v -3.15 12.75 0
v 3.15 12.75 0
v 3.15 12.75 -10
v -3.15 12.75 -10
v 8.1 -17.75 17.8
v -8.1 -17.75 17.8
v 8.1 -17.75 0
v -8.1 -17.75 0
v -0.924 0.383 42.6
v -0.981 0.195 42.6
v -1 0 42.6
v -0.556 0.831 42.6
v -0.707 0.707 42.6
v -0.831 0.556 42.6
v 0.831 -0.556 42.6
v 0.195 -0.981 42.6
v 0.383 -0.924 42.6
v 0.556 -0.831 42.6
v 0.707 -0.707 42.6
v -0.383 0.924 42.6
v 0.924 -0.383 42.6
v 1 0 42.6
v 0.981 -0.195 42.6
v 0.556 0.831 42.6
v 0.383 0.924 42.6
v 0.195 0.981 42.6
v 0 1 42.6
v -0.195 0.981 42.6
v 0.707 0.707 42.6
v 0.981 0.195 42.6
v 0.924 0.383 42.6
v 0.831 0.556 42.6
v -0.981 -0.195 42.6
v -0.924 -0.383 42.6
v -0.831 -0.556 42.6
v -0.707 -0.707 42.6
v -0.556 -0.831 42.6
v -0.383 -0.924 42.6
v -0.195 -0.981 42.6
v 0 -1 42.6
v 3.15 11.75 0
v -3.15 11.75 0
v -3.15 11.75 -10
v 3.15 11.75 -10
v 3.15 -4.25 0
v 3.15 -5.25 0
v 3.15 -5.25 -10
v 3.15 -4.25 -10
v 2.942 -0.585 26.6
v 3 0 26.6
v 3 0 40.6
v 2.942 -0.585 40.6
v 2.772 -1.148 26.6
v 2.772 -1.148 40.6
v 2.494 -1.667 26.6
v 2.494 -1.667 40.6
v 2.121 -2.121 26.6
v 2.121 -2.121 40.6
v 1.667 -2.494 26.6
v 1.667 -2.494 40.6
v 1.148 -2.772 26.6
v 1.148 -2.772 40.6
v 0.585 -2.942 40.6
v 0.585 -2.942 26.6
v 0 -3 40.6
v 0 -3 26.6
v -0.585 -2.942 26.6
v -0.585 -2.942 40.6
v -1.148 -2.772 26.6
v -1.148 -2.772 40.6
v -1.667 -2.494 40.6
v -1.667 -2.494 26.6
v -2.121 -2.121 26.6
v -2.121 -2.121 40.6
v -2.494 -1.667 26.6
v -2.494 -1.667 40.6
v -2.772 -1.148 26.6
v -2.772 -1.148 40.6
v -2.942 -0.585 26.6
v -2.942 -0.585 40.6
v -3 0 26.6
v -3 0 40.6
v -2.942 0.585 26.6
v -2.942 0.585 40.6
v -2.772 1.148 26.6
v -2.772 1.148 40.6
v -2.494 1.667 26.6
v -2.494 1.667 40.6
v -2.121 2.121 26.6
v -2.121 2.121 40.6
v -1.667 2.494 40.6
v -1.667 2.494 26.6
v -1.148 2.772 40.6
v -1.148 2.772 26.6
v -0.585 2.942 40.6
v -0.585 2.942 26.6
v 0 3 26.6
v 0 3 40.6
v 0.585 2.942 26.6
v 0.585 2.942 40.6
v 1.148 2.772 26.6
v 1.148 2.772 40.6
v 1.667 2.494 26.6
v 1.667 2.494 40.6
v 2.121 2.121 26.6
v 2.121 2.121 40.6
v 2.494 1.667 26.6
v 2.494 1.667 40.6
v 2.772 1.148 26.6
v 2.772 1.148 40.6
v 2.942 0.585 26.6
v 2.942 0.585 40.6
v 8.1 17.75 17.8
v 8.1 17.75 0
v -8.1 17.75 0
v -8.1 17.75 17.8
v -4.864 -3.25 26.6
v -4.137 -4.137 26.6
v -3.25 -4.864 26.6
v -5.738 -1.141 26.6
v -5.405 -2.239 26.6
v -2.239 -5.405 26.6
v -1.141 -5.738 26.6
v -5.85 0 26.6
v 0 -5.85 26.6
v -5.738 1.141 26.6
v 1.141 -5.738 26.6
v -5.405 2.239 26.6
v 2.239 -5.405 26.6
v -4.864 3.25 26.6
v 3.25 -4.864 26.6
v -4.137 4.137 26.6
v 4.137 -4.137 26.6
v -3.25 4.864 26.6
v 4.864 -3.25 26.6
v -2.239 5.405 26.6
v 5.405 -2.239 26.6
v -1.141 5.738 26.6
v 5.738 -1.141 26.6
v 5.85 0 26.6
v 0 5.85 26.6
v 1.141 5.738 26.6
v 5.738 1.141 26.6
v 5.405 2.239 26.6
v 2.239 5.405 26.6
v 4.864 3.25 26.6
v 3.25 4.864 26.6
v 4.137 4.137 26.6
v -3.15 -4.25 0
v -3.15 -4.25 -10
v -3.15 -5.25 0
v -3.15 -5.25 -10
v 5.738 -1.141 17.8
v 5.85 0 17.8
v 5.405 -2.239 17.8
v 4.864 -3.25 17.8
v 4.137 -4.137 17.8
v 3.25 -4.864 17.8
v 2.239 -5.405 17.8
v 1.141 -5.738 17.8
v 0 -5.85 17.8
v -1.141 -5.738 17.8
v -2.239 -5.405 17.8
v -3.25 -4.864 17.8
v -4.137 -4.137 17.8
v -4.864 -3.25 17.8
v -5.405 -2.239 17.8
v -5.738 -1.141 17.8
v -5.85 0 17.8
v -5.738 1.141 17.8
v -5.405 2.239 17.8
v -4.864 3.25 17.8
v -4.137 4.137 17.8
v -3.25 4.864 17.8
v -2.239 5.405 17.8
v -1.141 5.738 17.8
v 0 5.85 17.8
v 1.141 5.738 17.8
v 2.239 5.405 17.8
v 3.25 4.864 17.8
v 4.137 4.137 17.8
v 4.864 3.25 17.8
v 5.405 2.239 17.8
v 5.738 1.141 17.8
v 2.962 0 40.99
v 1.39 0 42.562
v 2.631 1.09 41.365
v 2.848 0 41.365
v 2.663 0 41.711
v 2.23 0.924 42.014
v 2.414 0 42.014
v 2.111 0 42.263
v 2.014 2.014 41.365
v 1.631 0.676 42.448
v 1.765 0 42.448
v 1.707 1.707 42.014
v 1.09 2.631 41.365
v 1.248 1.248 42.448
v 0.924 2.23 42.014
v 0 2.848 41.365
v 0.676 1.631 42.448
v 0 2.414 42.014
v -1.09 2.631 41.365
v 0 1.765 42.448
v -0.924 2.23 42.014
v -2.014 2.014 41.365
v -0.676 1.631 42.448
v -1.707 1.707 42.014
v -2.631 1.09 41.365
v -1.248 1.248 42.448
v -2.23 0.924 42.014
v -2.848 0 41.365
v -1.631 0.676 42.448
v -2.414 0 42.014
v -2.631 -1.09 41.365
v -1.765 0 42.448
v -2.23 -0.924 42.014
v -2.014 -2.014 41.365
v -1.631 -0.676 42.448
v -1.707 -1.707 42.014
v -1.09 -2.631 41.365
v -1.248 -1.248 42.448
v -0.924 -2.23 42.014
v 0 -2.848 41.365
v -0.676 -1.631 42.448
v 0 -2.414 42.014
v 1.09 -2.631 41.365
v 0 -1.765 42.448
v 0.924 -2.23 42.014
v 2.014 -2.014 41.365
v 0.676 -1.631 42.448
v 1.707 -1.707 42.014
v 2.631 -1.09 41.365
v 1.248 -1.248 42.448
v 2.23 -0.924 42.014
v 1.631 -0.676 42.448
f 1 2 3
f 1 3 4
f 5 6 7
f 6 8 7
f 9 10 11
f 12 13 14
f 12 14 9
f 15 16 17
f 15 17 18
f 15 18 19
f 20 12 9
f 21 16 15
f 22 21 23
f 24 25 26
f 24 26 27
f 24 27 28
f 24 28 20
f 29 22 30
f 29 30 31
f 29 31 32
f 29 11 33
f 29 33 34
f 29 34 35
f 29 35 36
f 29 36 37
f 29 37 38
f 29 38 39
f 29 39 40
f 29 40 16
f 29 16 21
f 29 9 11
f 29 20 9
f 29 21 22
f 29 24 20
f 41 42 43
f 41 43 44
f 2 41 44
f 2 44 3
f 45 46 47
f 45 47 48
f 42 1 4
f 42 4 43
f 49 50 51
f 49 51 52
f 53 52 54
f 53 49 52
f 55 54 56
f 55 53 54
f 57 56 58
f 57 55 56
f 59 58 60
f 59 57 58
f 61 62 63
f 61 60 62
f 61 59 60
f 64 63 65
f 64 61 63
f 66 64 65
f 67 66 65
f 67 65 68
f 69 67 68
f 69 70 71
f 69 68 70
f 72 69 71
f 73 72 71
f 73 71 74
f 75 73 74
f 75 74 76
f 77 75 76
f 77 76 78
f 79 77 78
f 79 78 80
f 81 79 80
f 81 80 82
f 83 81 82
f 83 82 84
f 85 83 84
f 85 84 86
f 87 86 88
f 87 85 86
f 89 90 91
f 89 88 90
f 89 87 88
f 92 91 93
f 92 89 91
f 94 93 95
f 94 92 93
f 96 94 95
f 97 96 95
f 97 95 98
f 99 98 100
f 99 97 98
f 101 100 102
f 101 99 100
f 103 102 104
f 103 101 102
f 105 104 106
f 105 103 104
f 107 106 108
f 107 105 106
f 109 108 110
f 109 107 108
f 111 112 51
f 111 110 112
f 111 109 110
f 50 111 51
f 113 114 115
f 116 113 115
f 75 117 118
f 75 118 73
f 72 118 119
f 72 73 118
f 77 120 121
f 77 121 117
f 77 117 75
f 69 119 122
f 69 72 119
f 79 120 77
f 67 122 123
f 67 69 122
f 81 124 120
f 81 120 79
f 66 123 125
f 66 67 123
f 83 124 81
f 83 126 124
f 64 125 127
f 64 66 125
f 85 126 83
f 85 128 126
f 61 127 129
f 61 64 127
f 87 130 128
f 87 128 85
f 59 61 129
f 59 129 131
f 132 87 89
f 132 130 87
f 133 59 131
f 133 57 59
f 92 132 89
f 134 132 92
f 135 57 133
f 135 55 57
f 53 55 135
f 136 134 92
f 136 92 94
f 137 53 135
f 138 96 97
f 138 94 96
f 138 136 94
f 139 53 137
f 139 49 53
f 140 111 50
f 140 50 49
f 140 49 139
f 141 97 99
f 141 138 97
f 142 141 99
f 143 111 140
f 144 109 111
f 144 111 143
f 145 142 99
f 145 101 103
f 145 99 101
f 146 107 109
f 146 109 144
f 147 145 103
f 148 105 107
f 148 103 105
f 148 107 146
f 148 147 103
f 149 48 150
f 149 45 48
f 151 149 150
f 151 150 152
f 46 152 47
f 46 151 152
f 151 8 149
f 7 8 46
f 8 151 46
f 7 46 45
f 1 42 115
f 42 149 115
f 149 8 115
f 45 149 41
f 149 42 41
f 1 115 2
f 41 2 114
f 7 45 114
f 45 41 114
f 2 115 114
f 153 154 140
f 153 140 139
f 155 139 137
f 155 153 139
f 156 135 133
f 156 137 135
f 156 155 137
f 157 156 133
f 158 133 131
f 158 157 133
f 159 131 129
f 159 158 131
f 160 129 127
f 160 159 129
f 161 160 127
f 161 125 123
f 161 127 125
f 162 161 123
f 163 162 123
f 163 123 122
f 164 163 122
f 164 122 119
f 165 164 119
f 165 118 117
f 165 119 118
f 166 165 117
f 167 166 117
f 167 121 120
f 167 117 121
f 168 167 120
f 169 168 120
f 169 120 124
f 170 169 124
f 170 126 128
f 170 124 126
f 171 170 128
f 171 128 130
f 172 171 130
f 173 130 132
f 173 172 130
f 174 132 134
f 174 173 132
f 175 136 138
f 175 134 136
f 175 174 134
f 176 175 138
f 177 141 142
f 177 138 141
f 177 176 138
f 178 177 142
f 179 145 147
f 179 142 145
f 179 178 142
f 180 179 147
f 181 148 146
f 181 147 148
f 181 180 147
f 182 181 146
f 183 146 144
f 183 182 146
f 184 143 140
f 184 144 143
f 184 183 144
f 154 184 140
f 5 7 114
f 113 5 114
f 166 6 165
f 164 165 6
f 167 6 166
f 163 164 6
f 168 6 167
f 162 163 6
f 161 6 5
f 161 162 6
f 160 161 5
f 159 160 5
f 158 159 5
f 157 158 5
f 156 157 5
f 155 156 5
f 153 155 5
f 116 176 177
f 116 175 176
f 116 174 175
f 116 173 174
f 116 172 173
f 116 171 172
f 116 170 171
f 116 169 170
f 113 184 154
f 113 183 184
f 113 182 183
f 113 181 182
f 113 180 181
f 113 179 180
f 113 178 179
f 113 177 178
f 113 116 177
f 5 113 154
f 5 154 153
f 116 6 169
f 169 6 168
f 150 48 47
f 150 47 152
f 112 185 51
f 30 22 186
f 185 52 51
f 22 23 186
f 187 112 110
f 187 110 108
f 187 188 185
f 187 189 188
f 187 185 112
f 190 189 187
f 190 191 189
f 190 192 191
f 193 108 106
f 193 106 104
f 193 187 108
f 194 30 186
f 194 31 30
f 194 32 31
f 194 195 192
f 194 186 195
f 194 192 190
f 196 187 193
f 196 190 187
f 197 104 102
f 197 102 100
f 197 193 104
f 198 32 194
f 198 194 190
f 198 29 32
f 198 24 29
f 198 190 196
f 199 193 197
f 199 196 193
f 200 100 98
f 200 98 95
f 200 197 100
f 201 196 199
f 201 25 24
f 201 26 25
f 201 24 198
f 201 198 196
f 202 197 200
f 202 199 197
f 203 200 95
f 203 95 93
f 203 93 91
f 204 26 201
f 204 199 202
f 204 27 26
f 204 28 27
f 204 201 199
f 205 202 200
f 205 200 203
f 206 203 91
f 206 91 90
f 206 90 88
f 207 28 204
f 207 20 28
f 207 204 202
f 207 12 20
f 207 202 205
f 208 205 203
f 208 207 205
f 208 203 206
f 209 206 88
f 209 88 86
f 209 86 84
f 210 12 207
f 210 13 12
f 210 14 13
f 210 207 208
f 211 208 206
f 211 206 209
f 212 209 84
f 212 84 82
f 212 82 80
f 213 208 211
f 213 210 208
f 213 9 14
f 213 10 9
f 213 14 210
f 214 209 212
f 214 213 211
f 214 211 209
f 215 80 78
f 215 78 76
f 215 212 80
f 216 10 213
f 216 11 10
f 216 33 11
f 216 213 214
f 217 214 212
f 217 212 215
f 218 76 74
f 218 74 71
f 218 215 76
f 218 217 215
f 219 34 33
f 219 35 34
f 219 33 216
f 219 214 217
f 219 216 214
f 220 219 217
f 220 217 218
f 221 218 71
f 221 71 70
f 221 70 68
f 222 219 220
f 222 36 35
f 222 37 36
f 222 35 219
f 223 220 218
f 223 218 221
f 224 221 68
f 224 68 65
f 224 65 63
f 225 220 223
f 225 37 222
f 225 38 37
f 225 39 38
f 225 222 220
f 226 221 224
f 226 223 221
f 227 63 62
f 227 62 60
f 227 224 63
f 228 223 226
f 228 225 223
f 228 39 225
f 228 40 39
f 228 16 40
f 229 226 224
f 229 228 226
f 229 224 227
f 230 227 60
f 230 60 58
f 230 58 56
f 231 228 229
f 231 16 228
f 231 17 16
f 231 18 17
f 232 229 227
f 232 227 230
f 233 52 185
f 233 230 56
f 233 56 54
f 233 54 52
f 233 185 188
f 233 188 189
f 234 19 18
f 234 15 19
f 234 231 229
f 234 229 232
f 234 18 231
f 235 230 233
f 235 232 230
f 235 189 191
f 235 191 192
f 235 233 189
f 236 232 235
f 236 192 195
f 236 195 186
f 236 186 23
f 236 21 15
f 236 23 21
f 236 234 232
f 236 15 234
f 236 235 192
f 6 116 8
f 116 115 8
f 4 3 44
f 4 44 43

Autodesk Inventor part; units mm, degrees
ref_plane "YZ Plane" through (0, 0, 0) normal (1, 0, 0) x (0, 1, 0)
ref_plane "XZ Plane" through (0, 0, 0) normal (0, 1, 0) x (-1, 0, 0)
ref_plane "XY Plane" through (0, 0, 0) normal (0, 0, 1) x (1, 0, 0)
sketch "Sketch1" plane through (0, 0, 0) normal (0, 0, 1) x (1, 0, 0)
  line L0 (-8.1, -17.75) -> (8.1, -17.75)
  line L1 (8.1, -17.75) -> (8.1, 17.75)
  line L2 (8.1, 17.75) -> (-8.1, 17.75)
  line L3 (-8.1, 17.75) -> (-8.1, -17.75)
  line L4 (-8.1, -17.75) -> (8.1, 17.75) construction
  line L5 (8.1, -17.75) -> (-8.1, 17.75) construction
  point P0 (0, 0)
  dimension "d0" = 16.2
  dimension "d1" = 35.5
extrude "Extrusion1" add sketch "Sketch1" along normal blind 17.8
sketch "Sketch2" plane through (0, 0, 17.8) normal (0, 0, 1) x (1, 0, 0)
  circle A0 centre (0, 0) radius 5.85
  dimension "d4" = 11.7
extrude "Extrusion2" add sketch "Sketch2" along normal blind 8.8
sketch "Sketch3" plane through (0, 0, 26.6) normal (0, 0, 1) x (1, 0, 0)
  circle A0 centre (0, 0) radius 3
  dimension "d7" = 6
extrude "Extrusion3" add sketch "Sketch3" along normal blind 16
fillet "Fillet1" radius 2 1 edges at (-3, 0, 42.6)
sketch "Sketch4" plane through (0, 0, 0) normal (0, 0, -1) x (-1, 0, 0)
  line L0 (-3.15, 12.75) -> (3.15, 12.75)
  line L1 (3.15, 12.75) -> (3.15, 11.75)
  line L2 (3.15, 11.75) -> (-3.15, 11.75)
  line L3 (-3.15, 11.75) -> (-3.15, 12.75)
  line L4 (-3.15, 12.75) -> (3.15, 11.75) construction
  line L5 (3.15, 12.75) -> (-3.15, 11.75) construction
  line L6 (-3.15, -4.25) -> (3.15, -4.25)
  line L7 (3.15, -4.25) -> (3.15, -5.25)
  line L8 (3.15, -5.25) -> (-3.15, -5.25)
  line L9 (-3.15, -5.25) -> (-3.15, -4.25)
  line L10 (-3.15, -4.25) -> (3.15, -5.25) construction
  line L11 (3.15, -4.25) -> (-3.15, -5.25) construction
  line L12 (-8.1, 17.75) -> (8.1, 17.75) projected
  line L13 (8.1, -17.75) -> (-8.1, -17.75) projected
  point P0 (0, 0)
  point P1 (0, 12.25)
  point P2 (0, -4.75)
  point P3 (0, 12.25)
  point P4 (0, -4.75)
  dimension "d11" = 6.3
  dimension "d12" = 1
  dimension "d13" = 6.3
  dimension "d14" = 1
  dimension "d15" = 5
  dimension "d16" = 12.5
extrude "Extrusion4" add sketch "Sketch4" along normal blind 10
thread "Thread1" size "M12x1.75" class "6g" standard "ANSI Metric M Profile" full length
properties part number "Schalter"
